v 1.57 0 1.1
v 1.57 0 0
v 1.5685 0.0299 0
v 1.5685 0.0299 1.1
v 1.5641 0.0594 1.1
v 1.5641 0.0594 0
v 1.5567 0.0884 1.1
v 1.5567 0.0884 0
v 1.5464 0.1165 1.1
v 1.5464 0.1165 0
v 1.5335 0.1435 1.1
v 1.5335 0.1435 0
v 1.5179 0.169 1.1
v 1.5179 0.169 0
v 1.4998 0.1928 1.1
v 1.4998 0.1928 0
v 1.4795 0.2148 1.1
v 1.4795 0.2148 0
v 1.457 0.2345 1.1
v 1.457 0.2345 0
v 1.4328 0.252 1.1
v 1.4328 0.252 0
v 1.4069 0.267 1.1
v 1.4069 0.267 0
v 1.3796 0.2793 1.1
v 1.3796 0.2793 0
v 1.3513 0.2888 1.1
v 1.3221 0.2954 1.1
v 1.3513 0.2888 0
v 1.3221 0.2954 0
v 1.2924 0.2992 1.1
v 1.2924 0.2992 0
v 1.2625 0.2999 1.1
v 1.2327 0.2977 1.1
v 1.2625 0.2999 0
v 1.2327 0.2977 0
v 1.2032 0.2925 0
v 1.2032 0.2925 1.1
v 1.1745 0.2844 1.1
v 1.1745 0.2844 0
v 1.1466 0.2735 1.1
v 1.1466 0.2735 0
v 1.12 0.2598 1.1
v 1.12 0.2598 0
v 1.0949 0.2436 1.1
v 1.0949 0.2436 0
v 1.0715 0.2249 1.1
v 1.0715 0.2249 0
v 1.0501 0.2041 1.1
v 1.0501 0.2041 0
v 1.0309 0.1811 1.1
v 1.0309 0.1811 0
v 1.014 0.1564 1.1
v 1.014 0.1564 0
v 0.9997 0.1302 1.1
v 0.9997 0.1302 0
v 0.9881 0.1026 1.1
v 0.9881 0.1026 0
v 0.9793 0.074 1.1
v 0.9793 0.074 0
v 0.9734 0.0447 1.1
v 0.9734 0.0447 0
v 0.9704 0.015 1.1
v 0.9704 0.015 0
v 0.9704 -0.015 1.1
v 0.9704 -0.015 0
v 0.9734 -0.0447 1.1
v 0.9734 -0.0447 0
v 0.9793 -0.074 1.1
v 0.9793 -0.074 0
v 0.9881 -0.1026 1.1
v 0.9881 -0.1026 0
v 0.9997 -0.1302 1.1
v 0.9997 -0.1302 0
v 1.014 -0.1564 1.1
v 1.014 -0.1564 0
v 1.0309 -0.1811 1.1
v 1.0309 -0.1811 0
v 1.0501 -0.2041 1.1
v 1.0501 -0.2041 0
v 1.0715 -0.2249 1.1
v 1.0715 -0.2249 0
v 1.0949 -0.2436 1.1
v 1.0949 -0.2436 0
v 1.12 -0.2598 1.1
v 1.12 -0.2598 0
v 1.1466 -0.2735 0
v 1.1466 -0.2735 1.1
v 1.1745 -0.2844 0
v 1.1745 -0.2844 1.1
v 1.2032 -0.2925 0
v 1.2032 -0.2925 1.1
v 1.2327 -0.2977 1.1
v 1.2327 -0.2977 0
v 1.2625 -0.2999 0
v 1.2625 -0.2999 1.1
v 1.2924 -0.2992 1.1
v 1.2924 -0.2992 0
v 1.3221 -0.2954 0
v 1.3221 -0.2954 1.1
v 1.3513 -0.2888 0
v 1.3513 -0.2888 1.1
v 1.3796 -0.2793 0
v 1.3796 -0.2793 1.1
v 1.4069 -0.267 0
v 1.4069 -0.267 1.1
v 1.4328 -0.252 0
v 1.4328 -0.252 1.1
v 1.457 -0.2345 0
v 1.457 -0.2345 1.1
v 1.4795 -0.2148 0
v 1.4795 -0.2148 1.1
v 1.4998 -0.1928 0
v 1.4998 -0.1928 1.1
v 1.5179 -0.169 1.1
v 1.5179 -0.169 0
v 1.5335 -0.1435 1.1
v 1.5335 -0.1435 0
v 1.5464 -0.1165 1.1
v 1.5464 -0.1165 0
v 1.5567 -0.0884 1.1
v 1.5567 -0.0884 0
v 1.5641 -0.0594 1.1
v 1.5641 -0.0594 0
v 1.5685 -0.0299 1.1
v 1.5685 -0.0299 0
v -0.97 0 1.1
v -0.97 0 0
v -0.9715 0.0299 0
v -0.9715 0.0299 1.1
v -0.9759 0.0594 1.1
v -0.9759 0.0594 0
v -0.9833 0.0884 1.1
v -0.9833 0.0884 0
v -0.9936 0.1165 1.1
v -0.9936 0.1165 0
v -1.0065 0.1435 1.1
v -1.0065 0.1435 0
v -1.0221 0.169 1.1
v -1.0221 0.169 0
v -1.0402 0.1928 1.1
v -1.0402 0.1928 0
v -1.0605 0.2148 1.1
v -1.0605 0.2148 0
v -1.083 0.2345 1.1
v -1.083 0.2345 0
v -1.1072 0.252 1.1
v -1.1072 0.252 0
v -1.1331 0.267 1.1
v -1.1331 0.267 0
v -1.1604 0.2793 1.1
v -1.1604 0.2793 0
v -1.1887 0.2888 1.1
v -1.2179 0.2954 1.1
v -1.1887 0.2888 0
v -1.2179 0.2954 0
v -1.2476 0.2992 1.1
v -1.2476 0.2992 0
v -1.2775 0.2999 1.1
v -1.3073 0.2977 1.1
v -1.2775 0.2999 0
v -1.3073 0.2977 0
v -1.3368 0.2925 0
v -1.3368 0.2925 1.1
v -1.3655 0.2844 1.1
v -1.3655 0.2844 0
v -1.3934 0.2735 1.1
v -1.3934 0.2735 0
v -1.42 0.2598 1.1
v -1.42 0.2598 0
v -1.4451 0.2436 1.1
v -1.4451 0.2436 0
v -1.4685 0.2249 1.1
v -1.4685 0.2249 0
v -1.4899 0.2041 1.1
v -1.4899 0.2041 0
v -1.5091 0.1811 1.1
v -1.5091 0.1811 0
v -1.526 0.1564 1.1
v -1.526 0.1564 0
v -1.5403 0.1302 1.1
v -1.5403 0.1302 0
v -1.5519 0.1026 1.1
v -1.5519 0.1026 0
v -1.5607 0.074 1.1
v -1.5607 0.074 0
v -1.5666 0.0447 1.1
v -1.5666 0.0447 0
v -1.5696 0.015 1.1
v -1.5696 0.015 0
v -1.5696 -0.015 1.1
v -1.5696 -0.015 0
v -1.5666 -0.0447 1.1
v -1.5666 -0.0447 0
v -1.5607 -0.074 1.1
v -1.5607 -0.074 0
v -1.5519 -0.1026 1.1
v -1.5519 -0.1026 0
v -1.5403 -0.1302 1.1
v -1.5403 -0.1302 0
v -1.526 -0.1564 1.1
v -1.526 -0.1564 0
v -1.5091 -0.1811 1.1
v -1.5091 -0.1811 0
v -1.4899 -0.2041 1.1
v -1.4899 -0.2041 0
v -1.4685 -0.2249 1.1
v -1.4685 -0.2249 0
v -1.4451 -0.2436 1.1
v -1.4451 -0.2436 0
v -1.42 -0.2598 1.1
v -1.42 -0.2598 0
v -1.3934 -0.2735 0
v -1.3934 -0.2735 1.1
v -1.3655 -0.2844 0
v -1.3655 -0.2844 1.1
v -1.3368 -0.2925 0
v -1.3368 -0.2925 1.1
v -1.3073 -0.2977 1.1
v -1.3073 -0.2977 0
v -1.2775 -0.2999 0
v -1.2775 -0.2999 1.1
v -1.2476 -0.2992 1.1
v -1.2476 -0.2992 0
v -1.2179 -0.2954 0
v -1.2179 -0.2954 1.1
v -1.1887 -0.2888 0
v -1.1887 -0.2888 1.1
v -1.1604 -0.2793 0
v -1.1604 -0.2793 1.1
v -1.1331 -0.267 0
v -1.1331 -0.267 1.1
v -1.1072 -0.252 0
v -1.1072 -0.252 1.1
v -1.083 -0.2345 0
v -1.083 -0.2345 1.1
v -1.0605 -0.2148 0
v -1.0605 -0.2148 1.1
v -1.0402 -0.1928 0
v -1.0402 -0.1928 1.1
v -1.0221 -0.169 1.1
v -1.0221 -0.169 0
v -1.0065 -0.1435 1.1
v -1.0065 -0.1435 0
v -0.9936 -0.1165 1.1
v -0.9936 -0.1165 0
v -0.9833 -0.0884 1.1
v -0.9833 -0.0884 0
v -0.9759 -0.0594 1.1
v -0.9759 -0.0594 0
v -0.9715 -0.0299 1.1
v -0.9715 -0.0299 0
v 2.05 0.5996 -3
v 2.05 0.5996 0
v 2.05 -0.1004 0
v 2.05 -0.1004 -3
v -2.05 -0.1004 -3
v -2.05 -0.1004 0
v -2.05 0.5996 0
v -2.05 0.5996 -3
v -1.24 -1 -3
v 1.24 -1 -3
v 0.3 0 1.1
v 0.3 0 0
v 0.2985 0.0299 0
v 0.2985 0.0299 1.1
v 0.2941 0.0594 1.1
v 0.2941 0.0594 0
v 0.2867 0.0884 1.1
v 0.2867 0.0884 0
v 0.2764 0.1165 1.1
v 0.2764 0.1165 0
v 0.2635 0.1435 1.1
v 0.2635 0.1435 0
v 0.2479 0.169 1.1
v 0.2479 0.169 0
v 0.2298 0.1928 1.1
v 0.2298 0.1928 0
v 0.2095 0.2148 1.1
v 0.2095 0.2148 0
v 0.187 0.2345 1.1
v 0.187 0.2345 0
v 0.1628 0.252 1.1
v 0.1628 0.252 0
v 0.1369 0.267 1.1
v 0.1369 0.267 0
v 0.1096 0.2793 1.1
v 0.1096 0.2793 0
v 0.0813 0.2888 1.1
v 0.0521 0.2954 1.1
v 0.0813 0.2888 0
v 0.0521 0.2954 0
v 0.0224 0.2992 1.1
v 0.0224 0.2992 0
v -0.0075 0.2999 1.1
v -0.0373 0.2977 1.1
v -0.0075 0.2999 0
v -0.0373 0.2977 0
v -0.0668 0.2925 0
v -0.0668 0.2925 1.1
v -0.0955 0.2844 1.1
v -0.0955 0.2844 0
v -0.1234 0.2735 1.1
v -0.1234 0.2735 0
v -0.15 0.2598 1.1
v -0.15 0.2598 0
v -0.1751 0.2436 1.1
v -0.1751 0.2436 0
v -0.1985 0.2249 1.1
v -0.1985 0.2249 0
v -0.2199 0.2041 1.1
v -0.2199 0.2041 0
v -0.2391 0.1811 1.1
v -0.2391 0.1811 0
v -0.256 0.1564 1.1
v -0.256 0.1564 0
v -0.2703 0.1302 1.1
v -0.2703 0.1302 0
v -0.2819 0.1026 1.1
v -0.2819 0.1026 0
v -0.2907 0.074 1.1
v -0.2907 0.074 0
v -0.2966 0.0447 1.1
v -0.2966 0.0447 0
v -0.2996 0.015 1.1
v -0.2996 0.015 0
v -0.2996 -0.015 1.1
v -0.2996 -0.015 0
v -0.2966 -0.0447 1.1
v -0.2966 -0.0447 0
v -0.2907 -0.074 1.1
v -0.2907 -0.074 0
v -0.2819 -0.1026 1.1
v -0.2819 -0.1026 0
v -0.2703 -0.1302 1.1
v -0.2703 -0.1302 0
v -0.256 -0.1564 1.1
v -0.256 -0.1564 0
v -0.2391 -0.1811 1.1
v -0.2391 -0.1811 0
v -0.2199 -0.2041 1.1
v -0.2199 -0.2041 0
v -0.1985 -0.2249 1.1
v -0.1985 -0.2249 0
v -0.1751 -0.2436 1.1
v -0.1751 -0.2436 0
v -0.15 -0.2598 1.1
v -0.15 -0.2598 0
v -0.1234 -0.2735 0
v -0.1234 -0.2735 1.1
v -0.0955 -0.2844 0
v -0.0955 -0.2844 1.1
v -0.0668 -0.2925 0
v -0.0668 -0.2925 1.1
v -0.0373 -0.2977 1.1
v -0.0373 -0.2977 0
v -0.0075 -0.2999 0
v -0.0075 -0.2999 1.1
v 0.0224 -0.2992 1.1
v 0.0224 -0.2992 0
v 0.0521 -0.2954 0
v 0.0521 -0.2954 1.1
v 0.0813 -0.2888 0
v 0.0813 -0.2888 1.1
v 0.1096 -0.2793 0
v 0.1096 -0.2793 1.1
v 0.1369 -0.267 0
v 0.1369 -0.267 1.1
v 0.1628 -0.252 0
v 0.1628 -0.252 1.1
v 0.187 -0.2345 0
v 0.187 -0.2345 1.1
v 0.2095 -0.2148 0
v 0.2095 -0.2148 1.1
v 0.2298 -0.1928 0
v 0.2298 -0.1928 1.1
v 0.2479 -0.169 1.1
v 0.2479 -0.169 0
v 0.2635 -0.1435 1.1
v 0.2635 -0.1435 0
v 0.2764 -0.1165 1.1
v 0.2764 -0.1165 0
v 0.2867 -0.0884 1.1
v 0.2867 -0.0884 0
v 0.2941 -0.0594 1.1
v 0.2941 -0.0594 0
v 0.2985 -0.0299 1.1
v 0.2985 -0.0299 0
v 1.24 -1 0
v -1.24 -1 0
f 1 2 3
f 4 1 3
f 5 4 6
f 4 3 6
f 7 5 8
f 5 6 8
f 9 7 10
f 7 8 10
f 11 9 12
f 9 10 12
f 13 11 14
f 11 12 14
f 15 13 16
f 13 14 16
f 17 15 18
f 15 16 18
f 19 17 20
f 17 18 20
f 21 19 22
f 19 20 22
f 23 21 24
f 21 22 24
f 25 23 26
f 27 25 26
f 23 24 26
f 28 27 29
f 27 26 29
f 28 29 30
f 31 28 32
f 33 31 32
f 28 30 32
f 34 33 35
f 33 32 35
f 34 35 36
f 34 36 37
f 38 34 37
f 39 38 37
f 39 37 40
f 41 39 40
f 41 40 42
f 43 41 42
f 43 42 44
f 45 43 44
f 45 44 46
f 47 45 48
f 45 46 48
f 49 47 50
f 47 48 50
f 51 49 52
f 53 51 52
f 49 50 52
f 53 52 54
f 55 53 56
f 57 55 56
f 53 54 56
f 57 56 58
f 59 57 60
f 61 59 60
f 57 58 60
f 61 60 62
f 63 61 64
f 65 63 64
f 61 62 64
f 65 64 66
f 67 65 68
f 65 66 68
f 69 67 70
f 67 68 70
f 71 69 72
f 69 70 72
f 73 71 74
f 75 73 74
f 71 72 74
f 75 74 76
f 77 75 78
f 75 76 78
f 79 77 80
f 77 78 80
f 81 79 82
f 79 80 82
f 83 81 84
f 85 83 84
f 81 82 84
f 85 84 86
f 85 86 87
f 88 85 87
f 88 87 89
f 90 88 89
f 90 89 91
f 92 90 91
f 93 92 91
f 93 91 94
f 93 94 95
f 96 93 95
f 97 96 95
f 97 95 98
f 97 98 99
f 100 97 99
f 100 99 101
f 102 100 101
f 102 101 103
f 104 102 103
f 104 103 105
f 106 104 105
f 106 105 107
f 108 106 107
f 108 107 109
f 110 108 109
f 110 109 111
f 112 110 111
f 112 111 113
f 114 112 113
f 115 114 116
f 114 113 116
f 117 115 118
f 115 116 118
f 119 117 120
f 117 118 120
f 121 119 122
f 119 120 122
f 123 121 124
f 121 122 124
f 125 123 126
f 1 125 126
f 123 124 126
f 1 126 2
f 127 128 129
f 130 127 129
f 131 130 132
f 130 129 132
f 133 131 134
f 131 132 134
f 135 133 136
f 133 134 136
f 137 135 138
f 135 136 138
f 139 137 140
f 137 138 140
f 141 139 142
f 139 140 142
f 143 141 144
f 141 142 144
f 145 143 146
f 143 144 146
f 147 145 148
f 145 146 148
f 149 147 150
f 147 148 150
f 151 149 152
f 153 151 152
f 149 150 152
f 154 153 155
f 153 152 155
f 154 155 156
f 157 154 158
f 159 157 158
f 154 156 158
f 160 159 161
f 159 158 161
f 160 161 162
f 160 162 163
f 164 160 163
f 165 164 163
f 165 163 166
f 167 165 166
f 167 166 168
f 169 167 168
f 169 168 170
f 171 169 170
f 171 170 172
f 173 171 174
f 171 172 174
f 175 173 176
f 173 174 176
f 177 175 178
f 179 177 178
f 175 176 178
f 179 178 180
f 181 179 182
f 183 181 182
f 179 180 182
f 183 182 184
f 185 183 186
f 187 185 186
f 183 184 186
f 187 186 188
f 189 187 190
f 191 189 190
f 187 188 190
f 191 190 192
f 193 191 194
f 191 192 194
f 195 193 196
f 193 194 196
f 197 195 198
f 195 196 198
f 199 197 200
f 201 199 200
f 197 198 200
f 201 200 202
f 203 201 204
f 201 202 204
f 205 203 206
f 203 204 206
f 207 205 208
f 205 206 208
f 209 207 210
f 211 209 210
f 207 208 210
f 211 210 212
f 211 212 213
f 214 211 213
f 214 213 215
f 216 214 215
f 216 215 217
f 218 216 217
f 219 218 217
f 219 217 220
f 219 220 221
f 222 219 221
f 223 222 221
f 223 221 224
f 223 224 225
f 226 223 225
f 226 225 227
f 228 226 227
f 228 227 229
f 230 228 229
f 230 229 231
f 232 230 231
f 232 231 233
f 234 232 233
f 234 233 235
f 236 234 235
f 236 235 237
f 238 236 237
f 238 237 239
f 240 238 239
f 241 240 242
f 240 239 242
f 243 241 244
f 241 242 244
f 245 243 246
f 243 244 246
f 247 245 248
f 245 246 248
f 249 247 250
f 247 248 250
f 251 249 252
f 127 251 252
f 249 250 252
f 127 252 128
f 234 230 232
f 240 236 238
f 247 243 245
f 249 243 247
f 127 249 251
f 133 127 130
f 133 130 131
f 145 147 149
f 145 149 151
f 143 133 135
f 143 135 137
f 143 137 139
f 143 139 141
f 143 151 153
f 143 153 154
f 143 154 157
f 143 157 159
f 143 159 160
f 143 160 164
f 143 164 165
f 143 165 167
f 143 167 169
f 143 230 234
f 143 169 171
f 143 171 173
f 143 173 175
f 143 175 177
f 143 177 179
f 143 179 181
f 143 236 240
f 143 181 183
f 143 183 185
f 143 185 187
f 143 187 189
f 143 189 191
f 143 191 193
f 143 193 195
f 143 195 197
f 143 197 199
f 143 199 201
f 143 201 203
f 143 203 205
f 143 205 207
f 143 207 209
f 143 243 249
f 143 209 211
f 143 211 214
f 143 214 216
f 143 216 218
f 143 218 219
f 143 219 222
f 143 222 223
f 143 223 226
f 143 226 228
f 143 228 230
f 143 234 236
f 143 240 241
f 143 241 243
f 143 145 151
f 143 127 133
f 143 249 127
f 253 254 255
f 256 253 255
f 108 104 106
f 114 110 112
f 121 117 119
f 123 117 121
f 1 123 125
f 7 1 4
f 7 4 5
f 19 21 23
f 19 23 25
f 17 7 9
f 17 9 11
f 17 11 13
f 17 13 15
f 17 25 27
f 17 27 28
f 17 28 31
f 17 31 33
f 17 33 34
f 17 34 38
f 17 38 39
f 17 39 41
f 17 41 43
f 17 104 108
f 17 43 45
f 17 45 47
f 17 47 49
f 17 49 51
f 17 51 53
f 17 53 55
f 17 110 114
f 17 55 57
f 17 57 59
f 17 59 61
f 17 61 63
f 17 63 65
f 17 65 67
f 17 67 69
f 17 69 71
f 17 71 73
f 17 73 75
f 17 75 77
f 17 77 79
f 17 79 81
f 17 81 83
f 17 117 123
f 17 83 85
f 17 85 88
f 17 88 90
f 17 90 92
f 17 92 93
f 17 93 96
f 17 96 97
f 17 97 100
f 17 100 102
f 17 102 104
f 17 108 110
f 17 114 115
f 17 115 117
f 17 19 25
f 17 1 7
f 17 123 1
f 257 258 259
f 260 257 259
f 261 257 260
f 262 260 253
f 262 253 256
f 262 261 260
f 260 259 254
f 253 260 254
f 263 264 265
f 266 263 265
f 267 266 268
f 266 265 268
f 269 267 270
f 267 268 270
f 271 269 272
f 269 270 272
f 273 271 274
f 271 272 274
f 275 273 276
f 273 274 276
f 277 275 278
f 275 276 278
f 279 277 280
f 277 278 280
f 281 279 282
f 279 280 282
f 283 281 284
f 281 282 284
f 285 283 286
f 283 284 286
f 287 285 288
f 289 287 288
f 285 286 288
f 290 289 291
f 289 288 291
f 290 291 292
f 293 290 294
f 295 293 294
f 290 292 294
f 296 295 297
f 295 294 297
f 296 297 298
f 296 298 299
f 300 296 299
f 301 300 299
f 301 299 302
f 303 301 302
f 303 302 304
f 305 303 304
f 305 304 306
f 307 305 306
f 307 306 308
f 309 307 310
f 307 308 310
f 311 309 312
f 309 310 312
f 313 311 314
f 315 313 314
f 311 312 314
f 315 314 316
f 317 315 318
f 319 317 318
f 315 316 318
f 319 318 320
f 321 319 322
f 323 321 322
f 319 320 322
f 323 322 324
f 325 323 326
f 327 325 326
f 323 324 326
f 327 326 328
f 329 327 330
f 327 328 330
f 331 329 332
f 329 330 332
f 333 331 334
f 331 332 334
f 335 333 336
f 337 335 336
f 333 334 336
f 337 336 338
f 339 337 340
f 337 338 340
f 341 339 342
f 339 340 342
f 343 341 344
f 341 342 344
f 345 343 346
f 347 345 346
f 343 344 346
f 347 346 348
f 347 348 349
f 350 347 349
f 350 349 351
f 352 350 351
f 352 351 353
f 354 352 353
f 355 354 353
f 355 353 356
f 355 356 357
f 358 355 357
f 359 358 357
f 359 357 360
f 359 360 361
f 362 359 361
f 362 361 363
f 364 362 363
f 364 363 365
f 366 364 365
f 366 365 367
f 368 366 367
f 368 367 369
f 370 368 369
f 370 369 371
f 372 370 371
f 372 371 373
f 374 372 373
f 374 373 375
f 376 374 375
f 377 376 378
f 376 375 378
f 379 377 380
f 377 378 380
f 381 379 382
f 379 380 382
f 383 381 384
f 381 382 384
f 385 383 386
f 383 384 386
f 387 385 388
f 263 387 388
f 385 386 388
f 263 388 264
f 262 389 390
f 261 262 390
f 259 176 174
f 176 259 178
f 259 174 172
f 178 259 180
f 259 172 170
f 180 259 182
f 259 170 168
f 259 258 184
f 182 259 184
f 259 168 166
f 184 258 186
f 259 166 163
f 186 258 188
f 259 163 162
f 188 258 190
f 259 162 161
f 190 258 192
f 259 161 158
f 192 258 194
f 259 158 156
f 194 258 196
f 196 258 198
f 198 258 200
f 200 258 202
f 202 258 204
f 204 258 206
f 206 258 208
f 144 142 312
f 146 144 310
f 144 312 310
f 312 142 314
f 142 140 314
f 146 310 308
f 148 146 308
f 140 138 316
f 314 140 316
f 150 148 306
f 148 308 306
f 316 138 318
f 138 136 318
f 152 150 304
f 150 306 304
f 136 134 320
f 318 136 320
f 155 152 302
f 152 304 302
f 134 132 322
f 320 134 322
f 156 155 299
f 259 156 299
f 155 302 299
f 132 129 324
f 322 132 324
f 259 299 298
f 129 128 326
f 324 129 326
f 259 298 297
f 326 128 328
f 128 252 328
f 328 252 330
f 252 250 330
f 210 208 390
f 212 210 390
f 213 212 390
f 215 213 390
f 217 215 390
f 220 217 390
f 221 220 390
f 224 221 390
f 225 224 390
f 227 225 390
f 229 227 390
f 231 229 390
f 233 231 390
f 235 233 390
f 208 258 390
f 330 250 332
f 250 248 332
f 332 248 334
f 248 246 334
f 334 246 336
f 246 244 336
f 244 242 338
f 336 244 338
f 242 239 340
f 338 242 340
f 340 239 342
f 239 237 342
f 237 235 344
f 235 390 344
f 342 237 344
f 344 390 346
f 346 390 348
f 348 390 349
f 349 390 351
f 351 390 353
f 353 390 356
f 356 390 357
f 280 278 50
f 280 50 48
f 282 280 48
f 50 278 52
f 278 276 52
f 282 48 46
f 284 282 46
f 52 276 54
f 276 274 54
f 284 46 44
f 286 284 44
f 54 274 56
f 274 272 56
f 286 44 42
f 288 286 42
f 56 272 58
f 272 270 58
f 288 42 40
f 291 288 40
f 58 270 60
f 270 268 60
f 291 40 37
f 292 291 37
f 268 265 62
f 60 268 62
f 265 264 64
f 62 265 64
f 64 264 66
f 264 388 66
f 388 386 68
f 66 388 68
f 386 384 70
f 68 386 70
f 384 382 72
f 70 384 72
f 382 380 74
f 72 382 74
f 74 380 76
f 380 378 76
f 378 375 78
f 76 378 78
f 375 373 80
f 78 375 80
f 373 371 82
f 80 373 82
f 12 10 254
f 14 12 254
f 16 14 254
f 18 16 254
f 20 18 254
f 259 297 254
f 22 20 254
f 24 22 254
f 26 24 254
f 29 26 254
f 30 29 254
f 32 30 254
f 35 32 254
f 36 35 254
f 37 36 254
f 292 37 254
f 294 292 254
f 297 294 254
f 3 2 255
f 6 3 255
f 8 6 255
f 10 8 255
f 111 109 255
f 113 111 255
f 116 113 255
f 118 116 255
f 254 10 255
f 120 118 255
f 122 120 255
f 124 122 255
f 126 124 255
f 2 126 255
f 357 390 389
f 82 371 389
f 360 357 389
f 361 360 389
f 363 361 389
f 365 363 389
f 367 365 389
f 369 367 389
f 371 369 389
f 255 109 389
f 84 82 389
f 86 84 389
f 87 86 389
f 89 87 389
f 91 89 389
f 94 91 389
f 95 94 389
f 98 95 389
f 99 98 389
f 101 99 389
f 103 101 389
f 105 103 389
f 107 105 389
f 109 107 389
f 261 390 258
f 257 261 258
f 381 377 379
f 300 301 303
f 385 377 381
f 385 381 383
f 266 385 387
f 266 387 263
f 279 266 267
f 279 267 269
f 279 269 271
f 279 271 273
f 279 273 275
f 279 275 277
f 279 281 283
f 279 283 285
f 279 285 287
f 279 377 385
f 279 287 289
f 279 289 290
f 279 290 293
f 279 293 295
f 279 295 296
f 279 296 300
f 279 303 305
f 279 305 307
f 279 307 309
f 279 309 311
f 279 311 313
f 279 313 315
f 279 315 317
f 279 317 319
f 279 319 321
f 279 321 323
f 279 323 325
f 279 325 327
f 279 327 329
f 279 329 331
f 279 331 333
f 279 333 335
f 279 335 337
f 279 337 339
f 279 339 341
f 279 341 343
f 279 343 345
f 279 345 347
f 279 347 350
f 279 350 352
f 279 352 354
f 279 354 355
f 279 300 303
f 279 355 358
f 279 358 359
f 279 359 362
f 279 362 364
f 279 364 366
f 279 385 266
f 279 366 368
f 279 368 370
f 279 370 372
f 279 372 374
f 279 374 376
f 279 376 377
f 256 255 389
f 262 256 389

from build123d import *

# Parameters (mm, degrees)
F0_R     = 0.3
F1_DEPTH = 1.1
F3_DEPTH = 3


with BuildPart() as f1:
    # F0 (on Top) → F1 (new body)
    with BuildSketch(Plane.XY):
        Circle(F0_R)
        with Locations((1.27, 0)):
            Circle(F0_R)
        with Locations((-1.27, 0)):
            Circle(F0_R)
    extrude(amount=F1_DEPTH)

    # F2 (on face) → F3 (join)
    with BuildSketch(Plane(origin=(0, 0, 0), x_dir=(1, 0, 0), z_dir=(0, 0, -1))):
        Polygon((1.24, 1), (-1.24, 1), (-2.05, 0.100404), (-2.05, -0.599596), (2.05, -0.599596), (2.05, 0.100404), align=None)
    extrude(amount=F3_DEPTH)


solid = f1.part
